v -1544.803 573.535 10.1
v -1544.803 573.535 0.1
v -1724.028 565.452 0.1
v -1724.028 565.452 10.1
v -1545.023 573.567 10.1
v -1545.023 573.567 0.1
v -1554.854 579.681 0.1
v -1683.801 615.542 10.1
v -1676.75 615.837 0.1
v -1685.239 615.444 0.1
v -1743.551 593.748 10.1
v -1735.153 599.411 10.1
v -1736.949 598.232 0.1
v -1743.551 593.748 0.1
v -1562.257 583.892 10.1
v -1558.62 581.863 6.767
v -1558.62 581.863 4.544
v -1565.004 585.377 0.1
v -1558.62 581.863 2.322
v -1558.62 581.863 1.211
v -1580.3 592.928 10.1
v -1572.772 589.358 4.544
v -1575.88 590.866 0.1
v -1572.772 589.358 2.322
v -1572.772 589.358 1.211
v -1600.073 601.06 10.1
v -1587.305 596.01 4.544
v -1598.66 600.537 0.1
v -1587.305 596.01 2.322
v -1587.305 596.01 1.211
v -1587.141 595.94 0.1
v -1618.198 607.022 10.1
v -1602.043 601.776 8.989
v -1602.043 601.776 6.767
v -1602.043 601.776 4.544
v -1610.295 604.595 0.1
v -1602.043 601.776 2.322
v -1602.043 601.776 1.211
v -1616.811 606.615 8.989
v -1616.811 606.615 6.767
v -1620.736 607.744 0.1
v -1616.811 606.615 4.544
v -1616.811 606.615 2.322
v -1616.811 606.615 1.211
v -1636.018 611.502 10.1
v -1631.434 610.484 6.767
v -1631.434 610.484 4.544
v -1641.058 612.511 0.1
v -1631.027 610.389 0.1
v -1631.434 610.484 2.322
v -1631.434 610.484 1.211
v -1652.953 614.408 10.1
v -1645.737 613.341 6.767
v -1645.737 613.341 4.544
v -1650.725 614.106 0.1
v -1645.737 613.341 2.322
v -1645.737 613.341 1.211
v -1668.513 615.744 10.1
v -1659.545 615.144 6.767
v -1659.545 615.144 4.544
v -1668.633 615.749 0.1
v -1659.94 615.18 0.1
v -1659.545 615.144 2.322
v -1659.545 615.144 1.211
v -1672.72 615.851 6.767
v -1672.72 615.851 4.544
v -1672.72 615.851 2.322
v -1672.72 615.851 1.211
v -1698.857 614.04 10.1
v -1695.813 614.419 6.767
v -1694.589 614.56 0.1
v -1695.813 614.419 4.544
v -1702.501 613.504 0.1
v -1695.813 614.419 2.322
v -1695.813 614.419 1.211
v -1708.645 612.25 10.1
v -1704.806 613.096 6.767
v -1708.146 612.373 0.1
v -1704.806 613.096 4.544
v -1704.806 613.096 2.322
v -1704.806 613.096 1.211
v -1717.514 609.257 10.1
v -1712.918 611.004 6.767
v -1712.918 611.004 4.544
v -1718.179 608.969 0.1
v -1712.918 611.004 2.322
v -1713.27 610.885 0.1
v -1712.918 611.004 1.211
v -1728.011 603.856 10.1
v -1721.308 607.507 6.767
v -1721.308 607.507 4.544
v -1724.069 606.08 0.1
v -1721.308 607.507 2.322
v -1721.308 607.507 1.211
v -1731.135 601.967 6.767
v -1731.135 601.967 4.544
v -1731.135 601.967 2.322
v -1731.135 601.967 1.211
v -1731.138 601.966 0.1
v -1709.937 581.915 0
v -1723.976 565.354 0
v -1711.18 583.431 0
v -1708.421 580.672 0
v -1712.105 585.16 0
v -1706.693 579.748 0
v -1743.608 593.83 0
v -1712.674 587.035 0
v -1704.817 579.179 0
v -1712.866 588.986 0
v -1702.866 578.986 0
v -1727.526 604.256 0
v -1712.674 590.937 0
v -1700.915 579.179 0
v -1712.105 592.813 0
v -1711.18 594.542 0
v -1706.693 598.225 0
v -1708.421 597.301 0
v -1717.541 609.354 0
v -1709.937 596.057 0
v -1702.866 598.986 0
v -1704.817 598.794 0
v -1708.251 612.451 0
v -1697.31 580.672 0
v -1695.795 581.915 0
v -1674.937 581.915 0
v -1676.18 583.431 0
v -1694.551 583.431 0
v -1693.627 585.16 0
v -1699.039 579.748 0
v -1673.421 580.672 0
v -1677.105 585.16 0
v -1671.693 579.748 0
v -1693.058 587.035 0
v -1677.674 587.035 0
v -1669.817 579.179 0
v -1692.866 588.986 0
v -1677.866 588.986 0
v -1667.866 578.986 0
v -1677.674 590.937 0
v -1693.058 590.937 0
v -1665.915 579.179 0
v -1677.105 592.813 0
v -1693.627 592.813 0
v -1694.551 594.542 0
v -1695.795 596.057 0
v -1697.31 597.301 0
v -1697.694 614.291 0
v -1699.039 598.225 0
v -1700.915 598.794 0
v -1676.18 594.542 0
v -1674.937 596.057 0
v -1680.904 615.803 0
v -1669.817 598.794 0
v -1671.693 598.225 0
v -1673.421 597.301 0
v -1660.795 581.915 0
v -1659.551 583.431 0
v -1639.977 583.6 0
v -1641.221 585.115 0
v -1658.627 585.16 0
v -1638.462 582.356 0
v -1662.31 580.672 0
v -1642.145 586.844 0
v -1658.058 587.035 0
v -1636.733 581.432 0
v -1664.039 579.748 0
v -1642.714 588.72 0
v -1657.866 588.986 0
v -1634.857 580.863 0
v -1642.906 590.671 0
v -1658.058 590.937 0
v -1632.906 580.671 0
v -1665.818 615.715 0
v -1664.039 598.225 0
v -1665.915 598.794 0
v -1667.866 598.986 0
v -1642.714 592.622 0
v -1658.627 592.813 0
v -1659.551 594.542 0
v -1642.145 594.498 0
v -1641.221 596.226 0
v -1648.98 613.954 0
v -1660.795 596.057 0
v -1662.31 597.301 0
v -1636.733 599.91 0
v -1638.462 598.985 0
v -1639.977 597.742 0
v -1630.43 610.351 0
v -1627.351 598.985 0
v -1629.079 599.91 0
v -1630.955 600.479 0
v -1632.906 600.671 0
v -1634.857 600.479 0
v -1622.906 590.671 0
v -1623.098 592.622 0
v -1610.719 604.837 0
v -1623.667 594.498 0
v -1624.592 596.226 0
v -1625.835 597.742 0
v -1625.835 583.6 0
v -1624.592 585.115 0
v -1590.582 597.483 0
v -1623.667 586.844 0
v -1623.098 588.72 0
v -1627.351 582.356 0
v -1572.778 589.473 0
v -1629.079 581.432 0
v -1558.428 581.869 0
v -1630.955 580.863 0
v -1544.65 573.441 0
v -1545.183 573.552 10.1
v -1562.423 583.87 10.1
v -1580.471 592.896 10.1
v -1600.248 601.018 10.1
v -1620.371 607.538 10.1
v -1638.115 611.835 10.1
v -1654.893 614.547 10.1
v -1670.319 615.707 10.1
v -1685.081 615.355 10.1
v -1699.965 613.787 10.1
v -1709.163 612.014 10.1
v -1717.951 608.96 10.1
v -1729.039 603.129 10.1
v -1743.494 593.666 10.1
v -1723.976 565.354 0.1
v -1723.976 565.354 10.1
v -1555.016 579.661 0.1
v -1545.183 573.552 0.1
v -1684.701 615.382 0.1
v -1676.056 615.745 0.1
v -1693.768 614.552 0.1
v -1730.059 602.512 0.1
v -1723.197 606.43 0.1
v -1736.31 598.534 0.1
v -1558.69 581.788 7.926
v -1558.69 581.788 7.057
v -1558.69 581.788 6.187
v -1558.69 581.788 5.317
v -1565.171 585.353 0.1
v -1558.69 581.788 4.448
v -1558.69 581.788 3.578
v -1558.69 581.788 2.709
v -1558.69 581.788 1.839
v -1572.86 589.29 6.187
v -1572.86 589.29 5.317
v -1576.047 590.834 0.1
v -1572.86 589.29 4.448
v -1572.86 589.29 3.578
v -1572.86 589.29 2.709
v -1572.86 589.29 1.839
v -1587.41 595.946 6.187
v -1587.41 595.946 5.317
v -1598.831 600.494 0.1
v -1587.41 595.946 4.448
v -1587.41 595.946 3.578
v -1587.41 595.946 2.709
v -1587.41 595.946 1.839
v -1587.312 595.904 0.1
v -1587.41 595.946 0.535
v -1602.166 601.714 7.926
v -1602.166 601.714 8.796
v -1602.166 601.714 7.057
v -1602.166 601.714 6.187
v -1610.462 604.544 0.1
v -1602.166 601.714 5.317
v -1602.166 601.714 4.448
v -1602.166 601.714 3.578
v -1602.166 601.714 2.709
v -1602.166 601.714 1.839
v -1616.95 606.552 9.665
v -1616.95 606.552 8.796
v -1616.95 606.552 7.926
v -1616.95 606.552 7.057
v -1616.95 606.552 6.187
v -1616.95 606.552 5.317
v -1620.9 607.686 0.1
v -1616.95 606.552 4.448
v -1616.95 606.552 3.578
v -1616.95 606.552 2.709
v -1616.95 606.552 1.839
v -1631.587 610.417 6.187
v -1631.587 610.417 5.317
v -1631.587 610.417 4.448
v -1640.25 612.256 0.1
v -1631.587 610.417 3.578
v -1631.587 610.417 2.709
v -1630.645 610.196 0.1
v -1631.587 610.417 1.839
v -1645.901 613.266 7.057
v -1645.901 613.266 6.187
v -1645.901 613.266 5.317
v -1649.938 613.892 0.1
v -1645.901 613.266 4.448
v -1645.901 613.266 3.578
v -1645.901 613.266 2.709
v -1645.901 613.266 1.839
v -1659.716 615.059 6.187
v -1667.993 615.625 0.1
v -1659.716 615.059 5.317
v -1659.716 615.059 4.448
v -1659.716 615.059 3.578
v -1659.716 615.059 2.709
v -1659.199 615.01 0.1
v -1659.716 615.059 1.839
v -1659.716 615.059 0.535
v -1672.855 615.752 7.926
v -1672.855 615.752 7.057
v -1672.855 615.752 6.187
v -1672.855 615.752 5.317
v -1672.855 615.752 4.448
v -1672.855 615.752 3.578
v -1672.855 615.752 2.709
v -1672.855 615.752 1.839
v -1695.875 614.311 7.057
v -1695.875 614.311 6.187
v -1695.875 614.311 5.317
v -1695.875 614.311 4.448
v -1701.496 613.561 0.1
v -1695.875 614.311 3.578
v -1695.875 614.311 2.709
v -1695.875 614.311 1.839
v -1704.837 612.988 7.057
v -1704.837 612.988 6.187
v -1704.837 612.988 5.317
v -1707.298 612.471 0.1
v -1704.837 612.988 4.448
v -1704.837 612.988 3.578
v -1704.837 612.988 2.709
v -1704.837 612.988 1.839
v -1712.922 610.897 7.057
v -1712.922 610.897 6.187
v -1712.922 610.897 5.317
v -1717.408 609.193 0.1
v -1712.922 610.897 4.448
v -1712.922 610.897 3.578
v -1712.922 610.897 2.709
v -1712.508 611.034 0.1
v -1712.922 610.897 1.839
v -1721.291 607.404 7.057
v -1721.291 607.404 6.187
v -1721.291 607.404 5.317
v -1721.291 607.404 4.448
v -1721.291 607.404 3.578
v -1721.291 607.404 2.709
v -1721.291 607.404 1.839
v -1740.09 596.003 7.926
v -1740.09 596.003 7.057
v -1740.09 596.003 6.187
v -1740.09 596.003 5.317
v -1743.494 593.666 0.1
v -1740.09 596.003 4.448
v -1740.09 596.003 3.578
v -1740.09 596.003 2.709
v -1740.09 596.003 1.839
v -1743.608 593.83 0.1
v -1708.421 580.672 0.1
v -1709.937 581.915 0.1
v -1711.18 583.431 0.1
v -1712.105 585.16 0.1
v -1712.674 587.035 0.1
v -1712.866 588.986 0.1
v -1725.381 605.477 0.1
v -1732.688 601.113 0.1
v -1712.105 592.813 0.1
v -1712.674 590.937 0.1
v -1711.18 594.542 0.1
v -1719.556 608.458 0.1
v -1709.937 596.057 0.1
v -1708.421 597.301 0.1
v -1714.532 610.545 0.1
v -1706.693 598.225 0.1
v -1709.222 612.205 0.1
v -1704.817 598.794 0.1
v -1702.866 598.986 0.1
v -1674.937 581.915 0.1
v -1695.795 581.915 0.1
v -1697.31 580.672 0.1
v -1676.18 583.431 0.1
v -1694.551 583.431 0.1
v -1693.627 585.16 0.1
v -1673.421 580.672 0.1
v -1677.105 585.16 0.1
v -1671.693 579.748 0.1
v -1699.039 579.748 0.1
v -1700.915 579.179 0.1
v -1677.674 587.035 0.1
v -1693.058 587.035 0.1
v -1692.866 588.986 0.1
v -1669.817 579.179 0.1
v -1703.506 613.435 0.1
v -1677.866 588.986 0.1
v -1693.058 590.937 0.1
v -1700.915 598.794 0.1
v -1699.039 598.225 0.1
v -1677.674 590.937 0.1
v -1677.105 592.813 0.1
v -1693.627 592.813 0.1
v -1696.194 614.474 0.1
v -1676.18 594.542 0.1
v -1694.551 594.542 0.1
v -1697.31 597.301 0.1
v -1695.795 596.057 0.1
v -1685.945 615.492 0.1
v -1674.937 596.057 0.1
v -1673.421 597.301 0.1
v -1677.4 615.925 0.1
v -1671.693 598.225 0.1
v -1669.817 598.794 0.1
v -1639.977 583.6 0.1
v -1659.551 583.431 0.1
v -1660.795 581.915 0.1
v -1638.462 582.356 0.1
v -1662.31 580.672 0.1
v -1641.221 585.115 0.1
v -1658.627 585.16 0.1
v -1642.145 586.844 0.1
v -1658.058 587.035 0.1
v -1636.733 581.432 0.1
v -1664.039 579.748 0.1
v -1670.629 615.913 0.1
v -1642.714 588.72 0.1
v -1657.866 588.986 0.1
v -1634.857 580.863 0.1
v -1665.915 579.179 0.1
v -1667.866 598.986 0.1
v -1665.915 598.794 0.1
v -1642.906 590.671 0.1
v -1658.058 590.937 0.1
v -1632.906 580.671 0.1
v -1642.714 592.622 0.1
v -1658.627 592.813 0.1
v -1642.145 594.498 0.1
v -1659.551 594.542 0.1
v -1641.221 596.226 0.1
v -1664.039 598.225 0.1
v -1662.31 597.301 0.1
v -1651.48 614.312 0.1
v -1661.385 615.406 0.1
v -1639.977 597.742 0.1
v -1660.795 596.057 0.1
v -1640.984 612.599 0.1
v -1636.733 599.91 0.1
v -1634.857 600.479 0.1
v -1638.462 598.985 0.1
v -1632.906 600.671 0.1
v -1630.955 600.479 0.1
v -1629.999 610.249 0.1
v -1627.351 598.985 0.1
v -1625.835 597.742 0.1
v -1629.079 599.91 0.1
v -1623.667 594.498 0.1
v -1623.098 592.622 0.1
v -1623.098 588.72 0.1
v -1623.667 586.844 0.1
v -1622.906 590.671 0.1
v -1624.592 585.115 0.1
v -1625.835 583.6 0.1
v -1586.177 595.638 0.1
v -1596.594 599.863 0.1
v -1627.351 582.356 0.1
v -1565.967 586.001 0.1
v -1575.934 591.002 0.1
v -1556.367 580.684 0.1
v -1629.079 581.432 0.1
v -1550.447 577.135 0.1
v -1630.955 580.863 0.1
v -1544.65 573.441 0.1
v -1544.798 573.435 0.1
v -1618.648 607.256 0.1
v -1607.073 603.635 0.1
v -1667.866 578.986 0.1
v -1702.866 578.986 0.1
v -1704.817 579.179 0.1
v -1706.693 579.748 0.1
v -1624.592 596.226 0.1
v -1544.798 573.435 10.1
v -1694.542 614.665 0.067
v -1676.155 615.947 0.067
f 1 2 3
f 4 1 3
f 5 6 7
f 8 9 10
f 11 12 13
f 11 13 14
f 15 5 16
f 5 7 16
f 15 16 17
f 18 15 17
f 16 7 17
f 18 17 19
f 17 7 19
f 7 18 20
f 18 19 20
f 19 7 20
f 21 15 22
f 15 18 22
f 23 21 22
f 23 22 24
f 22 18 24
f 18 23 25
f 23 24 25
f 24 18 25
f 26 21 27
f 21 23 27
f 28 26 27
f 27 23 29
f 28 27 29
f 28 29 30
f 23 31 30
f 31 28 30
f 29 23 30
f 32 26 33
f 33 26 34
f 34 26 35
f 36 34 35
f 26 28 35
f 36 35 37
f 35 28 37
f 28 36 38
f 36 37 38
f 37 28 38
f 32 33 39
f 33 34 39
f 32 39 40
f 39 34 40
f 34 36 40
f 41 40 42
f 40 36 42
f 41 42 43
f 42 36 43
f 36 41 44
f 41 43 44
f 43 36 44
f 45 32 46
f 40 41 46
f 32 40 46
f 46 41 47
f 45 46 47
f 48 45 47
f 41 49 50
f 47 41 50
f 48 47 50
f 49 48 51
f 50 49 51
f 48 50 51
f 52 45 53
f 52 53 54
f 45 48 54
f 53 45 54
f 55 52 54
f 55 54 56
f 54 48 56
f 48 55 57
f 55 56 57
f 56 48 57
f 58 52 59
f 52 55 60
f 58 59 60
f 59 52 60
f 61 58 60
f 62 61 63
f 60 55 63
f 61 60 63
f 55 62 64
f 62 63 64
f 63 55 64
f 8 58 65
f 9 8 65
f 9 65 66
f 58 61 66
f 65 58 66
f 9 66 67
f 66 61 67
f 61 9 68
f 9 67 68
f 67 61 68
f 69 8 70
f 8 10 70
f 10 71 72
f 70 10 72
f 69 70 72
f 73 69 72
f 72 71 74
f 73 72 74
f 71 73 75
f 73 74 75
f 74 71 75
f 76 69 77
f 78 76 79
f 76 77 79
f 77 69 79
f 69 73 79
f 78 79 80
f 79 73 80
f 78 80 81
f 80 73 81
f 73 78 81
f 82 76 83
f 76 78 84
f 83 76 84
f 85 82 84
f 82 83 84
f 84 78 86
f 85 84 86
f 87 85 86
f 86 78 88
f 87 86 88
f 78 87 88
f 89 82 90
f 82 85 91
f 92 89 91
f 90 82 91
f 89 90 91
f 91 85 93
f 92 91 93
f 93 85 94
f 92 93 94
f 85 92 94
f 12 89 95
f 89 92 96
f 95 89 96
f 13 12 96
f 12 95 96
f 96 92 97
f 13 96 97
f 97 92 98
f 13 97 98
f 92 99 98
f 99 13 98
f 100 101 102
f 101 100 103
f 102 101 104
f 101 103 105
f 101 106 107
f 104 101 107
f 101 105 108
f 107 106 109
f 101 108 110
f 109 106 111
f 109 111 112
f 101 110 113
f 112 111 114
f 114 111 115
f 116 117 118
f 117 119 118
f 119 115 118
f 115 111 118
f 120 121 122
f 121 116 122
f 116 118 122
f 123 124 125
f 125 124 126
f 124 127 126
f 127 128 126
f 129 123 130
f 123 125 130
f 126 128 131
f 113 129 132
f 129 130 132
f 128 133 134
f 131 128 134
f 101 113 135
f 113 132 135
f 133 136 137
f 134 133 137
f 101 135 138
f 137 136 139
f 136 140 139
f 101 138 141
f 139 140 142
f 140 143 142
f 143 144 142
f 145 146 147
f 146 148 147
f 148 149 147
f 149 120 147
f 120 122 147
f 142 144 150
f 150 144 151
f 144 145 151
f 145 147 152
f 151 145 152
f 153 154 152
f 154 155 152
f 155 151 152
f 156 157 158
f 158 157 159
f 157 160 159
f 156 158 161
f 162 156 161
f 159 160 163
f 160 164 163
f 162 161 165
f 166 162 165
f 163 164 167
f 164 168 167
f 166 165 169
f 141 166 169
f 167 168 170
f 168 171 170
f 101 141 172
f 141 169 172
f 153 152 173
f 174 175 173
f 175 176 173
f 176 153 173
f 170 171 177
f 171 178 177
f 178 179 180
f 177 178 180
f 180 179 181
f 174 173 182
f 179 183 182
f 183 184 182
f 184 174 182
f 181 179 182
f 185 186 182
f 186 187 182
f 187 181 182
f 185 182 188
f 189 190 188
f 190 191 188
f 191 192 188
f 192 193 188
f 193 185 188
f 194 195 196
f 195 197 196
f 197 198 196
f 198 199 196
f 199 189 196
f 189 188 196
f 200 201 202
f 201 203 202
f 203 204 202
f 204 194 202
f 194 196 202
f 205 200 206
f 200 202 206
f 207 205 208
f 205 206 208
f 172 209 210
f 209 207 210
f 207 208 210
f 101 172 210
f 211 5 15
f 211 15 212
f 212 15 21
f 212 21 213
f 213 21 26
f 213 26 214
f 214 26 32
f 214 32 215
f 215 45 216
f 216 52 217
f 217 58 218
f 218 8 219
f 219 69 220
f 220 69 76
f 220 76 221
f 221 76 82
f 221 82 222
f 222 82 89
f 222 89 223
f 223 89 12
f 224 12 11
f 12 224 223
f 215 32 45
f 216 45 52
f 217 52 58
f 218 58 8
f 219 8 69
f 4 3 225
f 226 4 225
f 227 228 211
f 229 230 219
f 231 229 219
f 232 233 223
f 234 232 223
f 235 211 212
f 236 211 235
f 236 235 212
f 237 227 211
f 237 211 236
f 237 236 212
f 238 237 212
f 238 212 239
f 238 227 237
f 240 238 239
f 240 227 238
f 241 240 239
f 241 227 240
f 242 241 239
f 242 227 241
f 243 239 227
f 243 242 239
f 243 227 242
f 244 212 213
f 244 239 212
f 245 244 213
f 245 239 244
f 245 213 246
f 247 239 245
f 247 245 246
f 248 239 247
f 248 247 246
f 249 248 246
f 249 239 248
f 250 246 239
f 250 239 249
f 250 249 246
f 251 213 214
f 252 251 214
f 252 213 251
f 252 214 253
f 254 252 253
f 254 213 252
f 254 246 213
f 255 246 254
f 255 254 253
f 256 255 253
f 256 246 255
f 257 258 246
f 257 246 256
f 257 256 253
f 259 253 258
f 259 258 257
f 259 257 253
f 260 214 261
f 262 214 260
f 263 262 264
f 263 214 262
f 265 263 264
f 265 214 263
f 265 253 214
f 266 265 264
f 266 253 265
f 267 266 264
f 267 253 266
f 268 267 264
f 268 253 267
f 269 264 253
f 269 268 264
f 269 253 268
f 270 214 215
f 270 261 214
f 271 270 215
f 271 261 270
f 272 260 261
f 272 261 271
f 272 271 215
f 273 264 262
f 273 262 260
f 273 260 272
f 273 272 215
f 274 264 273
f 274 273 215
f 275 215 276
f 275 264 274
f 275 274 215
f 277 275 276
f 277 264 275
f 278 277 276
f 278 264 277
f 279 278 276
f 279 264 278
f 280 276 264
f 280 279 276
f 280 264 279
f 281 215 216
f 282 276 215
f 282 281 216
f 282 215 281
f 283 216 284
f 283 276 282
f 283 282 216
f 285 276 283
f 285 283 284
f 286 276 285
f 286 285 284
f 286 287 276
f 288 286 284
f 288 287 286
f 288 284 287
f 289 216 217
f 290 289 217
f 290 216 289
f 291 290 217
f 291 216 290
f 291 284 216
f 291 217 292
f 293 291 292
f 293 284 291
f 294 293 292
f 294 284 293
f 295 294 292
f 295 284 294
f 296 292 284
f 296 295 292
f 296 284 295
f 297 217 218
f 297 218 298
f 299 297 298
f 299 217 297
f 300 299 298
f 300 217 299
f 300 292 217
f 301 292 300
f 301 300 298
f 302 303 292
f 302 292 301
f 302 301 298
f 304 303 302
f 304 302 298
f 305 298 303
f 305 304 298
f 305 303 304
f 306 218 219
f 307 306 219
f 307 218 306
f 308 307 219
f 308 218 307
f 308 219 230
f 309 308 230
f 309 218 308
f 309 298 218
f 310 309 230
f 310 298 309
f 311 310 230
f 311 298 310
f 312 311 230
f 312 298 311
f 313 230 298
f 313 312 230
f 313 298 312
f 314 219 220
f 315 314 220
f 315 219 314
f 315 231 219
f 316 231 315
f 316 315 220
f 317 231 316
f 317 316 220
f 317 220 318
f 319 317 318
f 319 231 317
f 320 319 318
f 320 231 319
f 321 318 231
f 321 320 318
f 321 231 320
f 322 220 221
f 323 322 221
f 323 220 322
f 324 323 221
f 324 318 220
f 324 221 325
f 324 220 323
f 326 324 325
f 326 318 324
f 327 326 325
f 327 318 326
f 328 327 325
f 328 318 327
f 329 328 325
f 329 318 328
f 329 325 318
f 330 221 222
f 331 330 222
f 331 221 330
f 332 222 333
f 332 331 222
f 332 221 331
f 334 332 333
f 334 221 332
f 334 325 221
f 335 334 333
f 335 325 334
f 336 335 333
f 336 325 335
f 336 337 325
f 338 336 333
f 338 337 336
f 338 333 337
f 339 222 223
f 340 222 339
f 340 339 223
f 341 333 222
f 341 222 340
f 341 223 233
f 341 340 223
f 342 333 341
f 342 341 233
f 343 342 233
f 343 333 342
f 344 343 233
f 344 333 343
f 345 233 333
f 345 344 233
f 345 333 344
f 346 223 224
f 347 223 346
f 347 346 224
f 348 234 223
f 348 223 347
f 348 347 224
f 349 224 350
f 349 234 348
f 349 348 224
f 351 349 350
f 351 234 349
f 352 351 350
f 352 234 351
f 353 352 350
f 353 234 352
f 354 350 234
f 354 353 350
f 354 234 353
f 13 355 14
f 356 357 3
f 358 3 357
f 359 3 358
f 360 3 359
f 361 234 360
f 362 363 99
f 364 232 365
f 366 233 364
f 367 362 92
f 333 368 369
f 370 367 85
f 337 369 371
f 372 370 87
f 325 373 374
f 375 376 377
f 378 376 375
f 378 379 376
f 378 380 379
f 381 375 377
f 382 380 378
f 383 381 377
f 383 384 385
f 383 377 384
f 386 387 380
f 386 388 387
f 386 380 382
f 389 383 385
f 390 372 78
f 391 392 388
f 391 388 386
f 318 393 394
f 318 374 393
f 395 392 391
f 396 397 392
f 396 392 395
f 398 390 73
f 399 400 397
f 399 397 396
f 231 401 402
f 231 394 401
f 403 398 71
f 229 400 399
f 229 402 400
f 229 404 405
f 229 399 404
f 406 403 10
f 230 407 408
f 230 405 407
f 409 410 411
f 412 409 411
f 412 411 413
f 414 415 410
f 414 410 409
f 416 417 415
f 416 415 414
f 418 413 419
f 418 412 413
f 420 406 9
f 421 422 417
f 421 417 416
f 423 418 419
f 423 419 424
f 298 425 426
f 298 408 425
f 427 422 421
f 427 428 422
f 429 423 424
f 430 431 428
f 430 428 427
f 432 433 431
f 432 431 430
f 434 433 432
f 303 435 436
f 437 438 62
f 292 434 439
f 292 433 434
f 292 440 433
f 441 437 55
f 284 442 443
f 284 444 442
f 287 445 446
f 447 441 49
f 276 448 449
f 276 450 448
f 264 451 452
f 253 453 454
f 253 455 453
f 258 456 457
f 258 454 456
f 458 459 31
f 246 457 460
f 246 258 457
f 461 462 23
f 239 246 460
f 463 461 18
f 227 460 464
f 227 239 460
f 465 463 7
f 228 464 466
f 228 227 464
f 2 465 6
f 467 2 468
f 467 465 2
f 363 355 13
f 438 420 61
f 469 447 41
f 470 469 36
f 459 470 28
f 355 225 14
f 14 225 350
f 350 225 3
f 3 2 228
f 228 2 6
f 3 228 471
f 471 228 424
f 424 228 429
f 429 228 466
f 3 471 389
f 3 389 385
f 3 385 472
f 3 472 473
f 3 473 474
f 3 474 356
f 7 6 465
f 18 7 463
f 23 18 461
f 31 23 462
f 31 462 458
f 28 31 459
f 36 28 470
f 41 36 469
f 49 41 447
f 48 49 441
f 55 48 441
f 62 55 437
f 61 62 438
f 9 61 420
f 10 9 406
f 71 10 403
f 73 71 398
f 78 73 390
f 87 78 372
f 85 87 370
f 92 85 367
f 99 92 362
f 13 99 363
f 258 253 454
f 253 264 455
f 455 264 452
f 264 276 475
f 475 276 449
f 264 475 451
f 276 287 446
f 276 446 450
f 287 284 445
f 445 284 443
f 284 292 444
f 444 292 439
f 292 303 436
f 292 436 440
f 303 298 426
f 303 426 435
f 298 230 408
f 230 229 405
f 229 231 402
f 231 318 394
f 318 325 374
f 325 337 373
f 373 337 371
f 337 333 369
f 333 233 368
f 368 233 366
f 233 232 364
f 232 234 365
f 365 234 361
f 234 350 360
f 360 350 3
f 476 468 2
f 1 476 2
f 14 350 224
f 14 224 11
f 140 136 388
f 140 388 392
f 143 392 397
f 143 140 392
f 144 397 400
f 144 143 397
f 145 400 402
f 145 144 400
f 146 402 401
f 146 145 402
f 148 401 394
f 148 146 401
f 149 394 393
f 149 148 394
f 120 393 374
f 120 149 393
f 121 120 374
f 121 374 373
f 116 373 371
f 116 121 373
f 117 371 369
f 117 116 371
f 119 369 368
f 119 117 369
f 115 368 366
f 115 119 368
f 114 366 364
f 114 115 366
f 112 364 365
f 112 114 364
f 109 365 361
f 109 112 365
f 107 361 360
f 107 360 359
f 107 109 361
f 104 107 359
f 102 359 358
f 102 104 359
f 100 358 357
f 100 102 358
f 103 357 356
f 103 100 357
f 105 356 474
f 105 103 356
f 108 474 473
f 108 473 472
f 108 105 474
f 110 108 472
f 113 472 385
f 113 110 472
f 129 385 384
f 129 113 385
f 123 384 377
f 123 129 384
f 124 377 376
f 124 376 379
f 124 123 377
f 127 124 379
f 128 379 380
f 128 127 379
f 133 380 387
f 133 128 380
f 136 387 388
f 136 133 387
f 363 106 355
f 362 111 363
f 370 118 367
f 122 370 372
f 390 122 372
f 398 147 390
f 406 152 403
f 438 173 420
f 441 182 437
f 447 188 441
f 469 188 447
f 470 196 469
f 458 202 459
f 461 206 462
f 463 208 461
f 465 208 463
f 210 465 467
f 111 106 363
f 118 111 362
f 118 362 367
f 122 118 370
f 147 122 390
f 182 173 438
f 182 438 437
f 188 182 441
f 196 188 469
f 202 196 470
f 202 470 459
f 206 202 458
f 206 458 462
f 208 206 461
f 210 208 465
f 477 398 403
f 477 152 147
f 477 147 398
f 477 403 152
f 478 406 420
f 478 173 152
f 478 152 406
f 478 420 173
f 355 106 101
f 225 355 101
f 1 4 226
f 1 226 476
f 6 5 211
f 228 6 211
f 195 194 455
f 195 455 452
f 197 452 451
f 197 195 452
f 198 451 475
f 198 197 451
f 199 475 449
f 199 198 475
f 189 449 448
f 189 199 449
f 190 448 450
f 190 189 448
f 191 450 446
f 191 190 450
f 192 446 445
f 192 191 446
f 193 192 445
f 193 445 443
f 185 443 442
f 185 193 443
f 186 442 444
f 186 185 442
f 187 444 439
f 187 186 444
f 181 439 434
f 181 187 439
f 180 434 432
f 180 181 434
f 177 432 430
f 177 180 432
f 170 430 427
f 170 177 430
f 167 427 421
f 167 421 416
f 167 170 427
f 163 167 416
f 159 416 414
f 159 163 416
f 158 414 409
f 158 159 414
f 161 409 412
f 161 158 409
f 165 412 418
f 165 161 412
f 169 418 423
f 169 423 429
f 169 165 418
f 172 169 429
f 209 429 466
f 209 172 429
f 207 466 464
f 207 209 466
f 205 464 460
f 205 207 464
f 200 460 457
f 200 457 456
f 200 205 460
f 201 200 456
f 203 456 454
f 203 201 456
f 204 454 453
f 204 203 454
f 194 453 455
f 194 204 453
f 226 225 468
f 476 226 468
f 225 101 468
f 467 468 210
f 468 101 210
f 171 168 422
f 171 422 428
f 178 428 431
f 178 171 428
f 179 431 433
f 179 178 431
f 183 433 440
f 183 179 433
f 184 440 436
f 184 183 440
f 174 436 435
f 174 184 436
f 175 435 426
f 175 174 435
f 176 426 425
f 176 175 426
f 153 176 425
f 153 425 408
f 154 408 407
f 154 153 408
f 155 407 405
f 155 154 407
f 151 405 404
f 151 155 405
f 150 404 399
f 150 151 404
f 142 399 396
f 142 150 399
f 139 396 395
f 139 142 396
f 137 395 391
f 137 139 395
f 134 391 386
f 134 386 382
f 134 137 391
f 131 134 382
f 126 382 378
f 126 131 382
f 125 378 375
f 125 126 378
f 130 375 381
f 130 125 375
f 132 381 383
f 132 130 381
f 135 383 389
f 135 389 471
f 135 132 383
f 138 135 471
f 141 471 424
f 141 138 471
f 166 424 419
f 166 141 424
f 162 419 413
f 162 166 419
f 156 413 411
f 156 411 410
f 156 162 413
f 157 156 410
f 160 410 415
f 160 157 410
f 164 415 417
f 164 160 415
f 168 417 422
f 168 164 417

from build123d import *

# Parameters (mm, degrees)
SKETCH1_R           = 10
BOSS_EXTRUDE1_DEPTH = 0.1
BOSS_EXTRUDE2_DEPTH = 10
BOSS_EXTRUDE5_DEPTH = 10


with BuildPart() as part:
    # Sketch1 → Boss-Extrude1 (new body)
    with BuildSketch(Plane.XY):
        with BuildLine():
            Line((-1743.607960183, 593.830470178), (-1723.97557604, 565.354199265))
            Line((-1723.97557604, 565.354199265), (-1544.649956659, 573.44143308))
            add(Edge.make_bspline(
                [(-1743.607960183, 593.830470178), (-1719.507904213, 610.537812828), (-1709.389541143, 613.399774739), (-1646.280289738, 619.241808081), (-1585.716648888, 600.423930323), (-1544.649956659, 573.44143308)],
                knots=[0, 0, 0, 0, 0.320554642, 0.420554642, 1, 1, 1, 1], degree=3))
        make_face()
        with Locations((-1632.906290904, 590.670757295)):
            Circle(SKETCH1_R, mode=Mode.SUBTRACT)
        with Locations((-1667.865738011, 588.986400452)):
            Circle(SKETCH1_R, mode=Mode.SUBTRACT)
        with Locations((-1702.865738011, 588.986400452)):
            Circle(SKETCH1_R, mode=Mode.SUBTRACT)
    extrude(amount=BOSS_EXTRUDE1_DEPTH)

    # Sketch2 → Boss-Extrude2 (add)
    with BuildSketch(Plane.XY.offset(0.1)):
        Polygon((-1724.027783053, 565.451946471), (-1723.97557604, 565.354199265), (-1544.79832648, 573.434741892), (-1544.802831705, 573.534640355), align=None)
    extrude(amount=BOSS_EXTRUDE2_DEPTH)

    # Sketch3 → Boss-Extrude5 (add)
    with BuildSketch(Plane.XY.offset(0.1)):
        with BuildLine():
            Line((-1545.023079711, 573.566578824), (-1545.182742706, 573.5515561))
            add(Edge.make_bspline(
                [(-1545.182742706, 573.5515561), (-1547.367111706, 574.980268212), (-1551.810044118, 577.785328256), (-1560.965598012, 583.174479228), (-1572.795764, 589.430500324), (-1587.376218754, 596.094131565), (-1607.088908765, 603.794197945), (-1626.860275971, 609.633108879), (-1645.984019518, 613.443251497), (-1659.830715168, 615.239913168), (-1672.989792243, 615.951202382), (-1683.282773373, 615.549802626), (-1690.803354798, 614.881158472), (-1697.680820628, 614.1264693), (-1704.980899474, 613.117091179), (-1711.55998554, 611.460964287), (-1716.962589709, 609.43710742), (-1721.23073898, 607.488971473), (-1725.859262309, 605.030940979), (-1730.13578168, 602.491531609), (-1733.880880623, 600.125360581), (-1736.867805363, 598.174714985), (-1739.526085034, 596.39020329), (-1741.749970087, 594.871411779), (-1742.918244581, 594.065255562), (-1743.494013607, 593.66610419)],
                knots=[0.001987871, 0.001987871, 0.001987871, 0.001987871, 0.032699504, 0.063902746, 0.126309229, 0.188715713, 0.251122197, 0.375935164, 0.438341647, 0.500748131, 0.563154615, 0.625561098, 0.65676434, 0.687967582, 0.750374066, 0.812780549, 0.843983791, 0.875187033, 0.906390275, 0.937593516, 0.953195137, 0.968796758, 0.984398379, 0.99219919, 1, 1, 1, 1], degree=3))
            Line((-1743.494013607, 593.66610419), (-1743.550986895, 593.748287184))
            add(Edge.make_bspline(
                [(-1545.023079711, 573.566578824), (-1580.385570882, 596.721777486), (-1623.540098869, 611.77846709), (-1664.058944494, 615.565415197), (-1668.460623745, 615.803565887), (-1674.850272895, 615.874635067), (-1676.946082289, 615.848904453), (-1681.051562144, 615.71013567), (-1685.067312648, 615.488156686), (-1688.83699666, 615.1571463), (-1692.450372149, 614.800321889), (-1694.177045989, 614.610346383), (-1699.085739343, 614.035305054), (-1702.019101267, 613.629485697), (-1710.378502815, 612.027658053), (-1715.364224243, 610.448022257), (-1727.252760657, 604.56560412), (-1734.155086468, 600.261986909), (-1743.550986895, 593.748287184)],
                knots=[0.001496262, 0.001496262, 0.001496262, 0.001496262, 0.5, 0.5, 0.5625, 0.5625, 0.59375, 0.59375, 0.625, 0.65625, 0.65625, 0.6875, 0.6875, 0.75, 0.75, 0.875, 0.875, 1, 1, 1, 1], degree=3))
        make_face()
    extrude(amount=BOSS_EXTRUDE5_DEPTH)


solid = part.part
